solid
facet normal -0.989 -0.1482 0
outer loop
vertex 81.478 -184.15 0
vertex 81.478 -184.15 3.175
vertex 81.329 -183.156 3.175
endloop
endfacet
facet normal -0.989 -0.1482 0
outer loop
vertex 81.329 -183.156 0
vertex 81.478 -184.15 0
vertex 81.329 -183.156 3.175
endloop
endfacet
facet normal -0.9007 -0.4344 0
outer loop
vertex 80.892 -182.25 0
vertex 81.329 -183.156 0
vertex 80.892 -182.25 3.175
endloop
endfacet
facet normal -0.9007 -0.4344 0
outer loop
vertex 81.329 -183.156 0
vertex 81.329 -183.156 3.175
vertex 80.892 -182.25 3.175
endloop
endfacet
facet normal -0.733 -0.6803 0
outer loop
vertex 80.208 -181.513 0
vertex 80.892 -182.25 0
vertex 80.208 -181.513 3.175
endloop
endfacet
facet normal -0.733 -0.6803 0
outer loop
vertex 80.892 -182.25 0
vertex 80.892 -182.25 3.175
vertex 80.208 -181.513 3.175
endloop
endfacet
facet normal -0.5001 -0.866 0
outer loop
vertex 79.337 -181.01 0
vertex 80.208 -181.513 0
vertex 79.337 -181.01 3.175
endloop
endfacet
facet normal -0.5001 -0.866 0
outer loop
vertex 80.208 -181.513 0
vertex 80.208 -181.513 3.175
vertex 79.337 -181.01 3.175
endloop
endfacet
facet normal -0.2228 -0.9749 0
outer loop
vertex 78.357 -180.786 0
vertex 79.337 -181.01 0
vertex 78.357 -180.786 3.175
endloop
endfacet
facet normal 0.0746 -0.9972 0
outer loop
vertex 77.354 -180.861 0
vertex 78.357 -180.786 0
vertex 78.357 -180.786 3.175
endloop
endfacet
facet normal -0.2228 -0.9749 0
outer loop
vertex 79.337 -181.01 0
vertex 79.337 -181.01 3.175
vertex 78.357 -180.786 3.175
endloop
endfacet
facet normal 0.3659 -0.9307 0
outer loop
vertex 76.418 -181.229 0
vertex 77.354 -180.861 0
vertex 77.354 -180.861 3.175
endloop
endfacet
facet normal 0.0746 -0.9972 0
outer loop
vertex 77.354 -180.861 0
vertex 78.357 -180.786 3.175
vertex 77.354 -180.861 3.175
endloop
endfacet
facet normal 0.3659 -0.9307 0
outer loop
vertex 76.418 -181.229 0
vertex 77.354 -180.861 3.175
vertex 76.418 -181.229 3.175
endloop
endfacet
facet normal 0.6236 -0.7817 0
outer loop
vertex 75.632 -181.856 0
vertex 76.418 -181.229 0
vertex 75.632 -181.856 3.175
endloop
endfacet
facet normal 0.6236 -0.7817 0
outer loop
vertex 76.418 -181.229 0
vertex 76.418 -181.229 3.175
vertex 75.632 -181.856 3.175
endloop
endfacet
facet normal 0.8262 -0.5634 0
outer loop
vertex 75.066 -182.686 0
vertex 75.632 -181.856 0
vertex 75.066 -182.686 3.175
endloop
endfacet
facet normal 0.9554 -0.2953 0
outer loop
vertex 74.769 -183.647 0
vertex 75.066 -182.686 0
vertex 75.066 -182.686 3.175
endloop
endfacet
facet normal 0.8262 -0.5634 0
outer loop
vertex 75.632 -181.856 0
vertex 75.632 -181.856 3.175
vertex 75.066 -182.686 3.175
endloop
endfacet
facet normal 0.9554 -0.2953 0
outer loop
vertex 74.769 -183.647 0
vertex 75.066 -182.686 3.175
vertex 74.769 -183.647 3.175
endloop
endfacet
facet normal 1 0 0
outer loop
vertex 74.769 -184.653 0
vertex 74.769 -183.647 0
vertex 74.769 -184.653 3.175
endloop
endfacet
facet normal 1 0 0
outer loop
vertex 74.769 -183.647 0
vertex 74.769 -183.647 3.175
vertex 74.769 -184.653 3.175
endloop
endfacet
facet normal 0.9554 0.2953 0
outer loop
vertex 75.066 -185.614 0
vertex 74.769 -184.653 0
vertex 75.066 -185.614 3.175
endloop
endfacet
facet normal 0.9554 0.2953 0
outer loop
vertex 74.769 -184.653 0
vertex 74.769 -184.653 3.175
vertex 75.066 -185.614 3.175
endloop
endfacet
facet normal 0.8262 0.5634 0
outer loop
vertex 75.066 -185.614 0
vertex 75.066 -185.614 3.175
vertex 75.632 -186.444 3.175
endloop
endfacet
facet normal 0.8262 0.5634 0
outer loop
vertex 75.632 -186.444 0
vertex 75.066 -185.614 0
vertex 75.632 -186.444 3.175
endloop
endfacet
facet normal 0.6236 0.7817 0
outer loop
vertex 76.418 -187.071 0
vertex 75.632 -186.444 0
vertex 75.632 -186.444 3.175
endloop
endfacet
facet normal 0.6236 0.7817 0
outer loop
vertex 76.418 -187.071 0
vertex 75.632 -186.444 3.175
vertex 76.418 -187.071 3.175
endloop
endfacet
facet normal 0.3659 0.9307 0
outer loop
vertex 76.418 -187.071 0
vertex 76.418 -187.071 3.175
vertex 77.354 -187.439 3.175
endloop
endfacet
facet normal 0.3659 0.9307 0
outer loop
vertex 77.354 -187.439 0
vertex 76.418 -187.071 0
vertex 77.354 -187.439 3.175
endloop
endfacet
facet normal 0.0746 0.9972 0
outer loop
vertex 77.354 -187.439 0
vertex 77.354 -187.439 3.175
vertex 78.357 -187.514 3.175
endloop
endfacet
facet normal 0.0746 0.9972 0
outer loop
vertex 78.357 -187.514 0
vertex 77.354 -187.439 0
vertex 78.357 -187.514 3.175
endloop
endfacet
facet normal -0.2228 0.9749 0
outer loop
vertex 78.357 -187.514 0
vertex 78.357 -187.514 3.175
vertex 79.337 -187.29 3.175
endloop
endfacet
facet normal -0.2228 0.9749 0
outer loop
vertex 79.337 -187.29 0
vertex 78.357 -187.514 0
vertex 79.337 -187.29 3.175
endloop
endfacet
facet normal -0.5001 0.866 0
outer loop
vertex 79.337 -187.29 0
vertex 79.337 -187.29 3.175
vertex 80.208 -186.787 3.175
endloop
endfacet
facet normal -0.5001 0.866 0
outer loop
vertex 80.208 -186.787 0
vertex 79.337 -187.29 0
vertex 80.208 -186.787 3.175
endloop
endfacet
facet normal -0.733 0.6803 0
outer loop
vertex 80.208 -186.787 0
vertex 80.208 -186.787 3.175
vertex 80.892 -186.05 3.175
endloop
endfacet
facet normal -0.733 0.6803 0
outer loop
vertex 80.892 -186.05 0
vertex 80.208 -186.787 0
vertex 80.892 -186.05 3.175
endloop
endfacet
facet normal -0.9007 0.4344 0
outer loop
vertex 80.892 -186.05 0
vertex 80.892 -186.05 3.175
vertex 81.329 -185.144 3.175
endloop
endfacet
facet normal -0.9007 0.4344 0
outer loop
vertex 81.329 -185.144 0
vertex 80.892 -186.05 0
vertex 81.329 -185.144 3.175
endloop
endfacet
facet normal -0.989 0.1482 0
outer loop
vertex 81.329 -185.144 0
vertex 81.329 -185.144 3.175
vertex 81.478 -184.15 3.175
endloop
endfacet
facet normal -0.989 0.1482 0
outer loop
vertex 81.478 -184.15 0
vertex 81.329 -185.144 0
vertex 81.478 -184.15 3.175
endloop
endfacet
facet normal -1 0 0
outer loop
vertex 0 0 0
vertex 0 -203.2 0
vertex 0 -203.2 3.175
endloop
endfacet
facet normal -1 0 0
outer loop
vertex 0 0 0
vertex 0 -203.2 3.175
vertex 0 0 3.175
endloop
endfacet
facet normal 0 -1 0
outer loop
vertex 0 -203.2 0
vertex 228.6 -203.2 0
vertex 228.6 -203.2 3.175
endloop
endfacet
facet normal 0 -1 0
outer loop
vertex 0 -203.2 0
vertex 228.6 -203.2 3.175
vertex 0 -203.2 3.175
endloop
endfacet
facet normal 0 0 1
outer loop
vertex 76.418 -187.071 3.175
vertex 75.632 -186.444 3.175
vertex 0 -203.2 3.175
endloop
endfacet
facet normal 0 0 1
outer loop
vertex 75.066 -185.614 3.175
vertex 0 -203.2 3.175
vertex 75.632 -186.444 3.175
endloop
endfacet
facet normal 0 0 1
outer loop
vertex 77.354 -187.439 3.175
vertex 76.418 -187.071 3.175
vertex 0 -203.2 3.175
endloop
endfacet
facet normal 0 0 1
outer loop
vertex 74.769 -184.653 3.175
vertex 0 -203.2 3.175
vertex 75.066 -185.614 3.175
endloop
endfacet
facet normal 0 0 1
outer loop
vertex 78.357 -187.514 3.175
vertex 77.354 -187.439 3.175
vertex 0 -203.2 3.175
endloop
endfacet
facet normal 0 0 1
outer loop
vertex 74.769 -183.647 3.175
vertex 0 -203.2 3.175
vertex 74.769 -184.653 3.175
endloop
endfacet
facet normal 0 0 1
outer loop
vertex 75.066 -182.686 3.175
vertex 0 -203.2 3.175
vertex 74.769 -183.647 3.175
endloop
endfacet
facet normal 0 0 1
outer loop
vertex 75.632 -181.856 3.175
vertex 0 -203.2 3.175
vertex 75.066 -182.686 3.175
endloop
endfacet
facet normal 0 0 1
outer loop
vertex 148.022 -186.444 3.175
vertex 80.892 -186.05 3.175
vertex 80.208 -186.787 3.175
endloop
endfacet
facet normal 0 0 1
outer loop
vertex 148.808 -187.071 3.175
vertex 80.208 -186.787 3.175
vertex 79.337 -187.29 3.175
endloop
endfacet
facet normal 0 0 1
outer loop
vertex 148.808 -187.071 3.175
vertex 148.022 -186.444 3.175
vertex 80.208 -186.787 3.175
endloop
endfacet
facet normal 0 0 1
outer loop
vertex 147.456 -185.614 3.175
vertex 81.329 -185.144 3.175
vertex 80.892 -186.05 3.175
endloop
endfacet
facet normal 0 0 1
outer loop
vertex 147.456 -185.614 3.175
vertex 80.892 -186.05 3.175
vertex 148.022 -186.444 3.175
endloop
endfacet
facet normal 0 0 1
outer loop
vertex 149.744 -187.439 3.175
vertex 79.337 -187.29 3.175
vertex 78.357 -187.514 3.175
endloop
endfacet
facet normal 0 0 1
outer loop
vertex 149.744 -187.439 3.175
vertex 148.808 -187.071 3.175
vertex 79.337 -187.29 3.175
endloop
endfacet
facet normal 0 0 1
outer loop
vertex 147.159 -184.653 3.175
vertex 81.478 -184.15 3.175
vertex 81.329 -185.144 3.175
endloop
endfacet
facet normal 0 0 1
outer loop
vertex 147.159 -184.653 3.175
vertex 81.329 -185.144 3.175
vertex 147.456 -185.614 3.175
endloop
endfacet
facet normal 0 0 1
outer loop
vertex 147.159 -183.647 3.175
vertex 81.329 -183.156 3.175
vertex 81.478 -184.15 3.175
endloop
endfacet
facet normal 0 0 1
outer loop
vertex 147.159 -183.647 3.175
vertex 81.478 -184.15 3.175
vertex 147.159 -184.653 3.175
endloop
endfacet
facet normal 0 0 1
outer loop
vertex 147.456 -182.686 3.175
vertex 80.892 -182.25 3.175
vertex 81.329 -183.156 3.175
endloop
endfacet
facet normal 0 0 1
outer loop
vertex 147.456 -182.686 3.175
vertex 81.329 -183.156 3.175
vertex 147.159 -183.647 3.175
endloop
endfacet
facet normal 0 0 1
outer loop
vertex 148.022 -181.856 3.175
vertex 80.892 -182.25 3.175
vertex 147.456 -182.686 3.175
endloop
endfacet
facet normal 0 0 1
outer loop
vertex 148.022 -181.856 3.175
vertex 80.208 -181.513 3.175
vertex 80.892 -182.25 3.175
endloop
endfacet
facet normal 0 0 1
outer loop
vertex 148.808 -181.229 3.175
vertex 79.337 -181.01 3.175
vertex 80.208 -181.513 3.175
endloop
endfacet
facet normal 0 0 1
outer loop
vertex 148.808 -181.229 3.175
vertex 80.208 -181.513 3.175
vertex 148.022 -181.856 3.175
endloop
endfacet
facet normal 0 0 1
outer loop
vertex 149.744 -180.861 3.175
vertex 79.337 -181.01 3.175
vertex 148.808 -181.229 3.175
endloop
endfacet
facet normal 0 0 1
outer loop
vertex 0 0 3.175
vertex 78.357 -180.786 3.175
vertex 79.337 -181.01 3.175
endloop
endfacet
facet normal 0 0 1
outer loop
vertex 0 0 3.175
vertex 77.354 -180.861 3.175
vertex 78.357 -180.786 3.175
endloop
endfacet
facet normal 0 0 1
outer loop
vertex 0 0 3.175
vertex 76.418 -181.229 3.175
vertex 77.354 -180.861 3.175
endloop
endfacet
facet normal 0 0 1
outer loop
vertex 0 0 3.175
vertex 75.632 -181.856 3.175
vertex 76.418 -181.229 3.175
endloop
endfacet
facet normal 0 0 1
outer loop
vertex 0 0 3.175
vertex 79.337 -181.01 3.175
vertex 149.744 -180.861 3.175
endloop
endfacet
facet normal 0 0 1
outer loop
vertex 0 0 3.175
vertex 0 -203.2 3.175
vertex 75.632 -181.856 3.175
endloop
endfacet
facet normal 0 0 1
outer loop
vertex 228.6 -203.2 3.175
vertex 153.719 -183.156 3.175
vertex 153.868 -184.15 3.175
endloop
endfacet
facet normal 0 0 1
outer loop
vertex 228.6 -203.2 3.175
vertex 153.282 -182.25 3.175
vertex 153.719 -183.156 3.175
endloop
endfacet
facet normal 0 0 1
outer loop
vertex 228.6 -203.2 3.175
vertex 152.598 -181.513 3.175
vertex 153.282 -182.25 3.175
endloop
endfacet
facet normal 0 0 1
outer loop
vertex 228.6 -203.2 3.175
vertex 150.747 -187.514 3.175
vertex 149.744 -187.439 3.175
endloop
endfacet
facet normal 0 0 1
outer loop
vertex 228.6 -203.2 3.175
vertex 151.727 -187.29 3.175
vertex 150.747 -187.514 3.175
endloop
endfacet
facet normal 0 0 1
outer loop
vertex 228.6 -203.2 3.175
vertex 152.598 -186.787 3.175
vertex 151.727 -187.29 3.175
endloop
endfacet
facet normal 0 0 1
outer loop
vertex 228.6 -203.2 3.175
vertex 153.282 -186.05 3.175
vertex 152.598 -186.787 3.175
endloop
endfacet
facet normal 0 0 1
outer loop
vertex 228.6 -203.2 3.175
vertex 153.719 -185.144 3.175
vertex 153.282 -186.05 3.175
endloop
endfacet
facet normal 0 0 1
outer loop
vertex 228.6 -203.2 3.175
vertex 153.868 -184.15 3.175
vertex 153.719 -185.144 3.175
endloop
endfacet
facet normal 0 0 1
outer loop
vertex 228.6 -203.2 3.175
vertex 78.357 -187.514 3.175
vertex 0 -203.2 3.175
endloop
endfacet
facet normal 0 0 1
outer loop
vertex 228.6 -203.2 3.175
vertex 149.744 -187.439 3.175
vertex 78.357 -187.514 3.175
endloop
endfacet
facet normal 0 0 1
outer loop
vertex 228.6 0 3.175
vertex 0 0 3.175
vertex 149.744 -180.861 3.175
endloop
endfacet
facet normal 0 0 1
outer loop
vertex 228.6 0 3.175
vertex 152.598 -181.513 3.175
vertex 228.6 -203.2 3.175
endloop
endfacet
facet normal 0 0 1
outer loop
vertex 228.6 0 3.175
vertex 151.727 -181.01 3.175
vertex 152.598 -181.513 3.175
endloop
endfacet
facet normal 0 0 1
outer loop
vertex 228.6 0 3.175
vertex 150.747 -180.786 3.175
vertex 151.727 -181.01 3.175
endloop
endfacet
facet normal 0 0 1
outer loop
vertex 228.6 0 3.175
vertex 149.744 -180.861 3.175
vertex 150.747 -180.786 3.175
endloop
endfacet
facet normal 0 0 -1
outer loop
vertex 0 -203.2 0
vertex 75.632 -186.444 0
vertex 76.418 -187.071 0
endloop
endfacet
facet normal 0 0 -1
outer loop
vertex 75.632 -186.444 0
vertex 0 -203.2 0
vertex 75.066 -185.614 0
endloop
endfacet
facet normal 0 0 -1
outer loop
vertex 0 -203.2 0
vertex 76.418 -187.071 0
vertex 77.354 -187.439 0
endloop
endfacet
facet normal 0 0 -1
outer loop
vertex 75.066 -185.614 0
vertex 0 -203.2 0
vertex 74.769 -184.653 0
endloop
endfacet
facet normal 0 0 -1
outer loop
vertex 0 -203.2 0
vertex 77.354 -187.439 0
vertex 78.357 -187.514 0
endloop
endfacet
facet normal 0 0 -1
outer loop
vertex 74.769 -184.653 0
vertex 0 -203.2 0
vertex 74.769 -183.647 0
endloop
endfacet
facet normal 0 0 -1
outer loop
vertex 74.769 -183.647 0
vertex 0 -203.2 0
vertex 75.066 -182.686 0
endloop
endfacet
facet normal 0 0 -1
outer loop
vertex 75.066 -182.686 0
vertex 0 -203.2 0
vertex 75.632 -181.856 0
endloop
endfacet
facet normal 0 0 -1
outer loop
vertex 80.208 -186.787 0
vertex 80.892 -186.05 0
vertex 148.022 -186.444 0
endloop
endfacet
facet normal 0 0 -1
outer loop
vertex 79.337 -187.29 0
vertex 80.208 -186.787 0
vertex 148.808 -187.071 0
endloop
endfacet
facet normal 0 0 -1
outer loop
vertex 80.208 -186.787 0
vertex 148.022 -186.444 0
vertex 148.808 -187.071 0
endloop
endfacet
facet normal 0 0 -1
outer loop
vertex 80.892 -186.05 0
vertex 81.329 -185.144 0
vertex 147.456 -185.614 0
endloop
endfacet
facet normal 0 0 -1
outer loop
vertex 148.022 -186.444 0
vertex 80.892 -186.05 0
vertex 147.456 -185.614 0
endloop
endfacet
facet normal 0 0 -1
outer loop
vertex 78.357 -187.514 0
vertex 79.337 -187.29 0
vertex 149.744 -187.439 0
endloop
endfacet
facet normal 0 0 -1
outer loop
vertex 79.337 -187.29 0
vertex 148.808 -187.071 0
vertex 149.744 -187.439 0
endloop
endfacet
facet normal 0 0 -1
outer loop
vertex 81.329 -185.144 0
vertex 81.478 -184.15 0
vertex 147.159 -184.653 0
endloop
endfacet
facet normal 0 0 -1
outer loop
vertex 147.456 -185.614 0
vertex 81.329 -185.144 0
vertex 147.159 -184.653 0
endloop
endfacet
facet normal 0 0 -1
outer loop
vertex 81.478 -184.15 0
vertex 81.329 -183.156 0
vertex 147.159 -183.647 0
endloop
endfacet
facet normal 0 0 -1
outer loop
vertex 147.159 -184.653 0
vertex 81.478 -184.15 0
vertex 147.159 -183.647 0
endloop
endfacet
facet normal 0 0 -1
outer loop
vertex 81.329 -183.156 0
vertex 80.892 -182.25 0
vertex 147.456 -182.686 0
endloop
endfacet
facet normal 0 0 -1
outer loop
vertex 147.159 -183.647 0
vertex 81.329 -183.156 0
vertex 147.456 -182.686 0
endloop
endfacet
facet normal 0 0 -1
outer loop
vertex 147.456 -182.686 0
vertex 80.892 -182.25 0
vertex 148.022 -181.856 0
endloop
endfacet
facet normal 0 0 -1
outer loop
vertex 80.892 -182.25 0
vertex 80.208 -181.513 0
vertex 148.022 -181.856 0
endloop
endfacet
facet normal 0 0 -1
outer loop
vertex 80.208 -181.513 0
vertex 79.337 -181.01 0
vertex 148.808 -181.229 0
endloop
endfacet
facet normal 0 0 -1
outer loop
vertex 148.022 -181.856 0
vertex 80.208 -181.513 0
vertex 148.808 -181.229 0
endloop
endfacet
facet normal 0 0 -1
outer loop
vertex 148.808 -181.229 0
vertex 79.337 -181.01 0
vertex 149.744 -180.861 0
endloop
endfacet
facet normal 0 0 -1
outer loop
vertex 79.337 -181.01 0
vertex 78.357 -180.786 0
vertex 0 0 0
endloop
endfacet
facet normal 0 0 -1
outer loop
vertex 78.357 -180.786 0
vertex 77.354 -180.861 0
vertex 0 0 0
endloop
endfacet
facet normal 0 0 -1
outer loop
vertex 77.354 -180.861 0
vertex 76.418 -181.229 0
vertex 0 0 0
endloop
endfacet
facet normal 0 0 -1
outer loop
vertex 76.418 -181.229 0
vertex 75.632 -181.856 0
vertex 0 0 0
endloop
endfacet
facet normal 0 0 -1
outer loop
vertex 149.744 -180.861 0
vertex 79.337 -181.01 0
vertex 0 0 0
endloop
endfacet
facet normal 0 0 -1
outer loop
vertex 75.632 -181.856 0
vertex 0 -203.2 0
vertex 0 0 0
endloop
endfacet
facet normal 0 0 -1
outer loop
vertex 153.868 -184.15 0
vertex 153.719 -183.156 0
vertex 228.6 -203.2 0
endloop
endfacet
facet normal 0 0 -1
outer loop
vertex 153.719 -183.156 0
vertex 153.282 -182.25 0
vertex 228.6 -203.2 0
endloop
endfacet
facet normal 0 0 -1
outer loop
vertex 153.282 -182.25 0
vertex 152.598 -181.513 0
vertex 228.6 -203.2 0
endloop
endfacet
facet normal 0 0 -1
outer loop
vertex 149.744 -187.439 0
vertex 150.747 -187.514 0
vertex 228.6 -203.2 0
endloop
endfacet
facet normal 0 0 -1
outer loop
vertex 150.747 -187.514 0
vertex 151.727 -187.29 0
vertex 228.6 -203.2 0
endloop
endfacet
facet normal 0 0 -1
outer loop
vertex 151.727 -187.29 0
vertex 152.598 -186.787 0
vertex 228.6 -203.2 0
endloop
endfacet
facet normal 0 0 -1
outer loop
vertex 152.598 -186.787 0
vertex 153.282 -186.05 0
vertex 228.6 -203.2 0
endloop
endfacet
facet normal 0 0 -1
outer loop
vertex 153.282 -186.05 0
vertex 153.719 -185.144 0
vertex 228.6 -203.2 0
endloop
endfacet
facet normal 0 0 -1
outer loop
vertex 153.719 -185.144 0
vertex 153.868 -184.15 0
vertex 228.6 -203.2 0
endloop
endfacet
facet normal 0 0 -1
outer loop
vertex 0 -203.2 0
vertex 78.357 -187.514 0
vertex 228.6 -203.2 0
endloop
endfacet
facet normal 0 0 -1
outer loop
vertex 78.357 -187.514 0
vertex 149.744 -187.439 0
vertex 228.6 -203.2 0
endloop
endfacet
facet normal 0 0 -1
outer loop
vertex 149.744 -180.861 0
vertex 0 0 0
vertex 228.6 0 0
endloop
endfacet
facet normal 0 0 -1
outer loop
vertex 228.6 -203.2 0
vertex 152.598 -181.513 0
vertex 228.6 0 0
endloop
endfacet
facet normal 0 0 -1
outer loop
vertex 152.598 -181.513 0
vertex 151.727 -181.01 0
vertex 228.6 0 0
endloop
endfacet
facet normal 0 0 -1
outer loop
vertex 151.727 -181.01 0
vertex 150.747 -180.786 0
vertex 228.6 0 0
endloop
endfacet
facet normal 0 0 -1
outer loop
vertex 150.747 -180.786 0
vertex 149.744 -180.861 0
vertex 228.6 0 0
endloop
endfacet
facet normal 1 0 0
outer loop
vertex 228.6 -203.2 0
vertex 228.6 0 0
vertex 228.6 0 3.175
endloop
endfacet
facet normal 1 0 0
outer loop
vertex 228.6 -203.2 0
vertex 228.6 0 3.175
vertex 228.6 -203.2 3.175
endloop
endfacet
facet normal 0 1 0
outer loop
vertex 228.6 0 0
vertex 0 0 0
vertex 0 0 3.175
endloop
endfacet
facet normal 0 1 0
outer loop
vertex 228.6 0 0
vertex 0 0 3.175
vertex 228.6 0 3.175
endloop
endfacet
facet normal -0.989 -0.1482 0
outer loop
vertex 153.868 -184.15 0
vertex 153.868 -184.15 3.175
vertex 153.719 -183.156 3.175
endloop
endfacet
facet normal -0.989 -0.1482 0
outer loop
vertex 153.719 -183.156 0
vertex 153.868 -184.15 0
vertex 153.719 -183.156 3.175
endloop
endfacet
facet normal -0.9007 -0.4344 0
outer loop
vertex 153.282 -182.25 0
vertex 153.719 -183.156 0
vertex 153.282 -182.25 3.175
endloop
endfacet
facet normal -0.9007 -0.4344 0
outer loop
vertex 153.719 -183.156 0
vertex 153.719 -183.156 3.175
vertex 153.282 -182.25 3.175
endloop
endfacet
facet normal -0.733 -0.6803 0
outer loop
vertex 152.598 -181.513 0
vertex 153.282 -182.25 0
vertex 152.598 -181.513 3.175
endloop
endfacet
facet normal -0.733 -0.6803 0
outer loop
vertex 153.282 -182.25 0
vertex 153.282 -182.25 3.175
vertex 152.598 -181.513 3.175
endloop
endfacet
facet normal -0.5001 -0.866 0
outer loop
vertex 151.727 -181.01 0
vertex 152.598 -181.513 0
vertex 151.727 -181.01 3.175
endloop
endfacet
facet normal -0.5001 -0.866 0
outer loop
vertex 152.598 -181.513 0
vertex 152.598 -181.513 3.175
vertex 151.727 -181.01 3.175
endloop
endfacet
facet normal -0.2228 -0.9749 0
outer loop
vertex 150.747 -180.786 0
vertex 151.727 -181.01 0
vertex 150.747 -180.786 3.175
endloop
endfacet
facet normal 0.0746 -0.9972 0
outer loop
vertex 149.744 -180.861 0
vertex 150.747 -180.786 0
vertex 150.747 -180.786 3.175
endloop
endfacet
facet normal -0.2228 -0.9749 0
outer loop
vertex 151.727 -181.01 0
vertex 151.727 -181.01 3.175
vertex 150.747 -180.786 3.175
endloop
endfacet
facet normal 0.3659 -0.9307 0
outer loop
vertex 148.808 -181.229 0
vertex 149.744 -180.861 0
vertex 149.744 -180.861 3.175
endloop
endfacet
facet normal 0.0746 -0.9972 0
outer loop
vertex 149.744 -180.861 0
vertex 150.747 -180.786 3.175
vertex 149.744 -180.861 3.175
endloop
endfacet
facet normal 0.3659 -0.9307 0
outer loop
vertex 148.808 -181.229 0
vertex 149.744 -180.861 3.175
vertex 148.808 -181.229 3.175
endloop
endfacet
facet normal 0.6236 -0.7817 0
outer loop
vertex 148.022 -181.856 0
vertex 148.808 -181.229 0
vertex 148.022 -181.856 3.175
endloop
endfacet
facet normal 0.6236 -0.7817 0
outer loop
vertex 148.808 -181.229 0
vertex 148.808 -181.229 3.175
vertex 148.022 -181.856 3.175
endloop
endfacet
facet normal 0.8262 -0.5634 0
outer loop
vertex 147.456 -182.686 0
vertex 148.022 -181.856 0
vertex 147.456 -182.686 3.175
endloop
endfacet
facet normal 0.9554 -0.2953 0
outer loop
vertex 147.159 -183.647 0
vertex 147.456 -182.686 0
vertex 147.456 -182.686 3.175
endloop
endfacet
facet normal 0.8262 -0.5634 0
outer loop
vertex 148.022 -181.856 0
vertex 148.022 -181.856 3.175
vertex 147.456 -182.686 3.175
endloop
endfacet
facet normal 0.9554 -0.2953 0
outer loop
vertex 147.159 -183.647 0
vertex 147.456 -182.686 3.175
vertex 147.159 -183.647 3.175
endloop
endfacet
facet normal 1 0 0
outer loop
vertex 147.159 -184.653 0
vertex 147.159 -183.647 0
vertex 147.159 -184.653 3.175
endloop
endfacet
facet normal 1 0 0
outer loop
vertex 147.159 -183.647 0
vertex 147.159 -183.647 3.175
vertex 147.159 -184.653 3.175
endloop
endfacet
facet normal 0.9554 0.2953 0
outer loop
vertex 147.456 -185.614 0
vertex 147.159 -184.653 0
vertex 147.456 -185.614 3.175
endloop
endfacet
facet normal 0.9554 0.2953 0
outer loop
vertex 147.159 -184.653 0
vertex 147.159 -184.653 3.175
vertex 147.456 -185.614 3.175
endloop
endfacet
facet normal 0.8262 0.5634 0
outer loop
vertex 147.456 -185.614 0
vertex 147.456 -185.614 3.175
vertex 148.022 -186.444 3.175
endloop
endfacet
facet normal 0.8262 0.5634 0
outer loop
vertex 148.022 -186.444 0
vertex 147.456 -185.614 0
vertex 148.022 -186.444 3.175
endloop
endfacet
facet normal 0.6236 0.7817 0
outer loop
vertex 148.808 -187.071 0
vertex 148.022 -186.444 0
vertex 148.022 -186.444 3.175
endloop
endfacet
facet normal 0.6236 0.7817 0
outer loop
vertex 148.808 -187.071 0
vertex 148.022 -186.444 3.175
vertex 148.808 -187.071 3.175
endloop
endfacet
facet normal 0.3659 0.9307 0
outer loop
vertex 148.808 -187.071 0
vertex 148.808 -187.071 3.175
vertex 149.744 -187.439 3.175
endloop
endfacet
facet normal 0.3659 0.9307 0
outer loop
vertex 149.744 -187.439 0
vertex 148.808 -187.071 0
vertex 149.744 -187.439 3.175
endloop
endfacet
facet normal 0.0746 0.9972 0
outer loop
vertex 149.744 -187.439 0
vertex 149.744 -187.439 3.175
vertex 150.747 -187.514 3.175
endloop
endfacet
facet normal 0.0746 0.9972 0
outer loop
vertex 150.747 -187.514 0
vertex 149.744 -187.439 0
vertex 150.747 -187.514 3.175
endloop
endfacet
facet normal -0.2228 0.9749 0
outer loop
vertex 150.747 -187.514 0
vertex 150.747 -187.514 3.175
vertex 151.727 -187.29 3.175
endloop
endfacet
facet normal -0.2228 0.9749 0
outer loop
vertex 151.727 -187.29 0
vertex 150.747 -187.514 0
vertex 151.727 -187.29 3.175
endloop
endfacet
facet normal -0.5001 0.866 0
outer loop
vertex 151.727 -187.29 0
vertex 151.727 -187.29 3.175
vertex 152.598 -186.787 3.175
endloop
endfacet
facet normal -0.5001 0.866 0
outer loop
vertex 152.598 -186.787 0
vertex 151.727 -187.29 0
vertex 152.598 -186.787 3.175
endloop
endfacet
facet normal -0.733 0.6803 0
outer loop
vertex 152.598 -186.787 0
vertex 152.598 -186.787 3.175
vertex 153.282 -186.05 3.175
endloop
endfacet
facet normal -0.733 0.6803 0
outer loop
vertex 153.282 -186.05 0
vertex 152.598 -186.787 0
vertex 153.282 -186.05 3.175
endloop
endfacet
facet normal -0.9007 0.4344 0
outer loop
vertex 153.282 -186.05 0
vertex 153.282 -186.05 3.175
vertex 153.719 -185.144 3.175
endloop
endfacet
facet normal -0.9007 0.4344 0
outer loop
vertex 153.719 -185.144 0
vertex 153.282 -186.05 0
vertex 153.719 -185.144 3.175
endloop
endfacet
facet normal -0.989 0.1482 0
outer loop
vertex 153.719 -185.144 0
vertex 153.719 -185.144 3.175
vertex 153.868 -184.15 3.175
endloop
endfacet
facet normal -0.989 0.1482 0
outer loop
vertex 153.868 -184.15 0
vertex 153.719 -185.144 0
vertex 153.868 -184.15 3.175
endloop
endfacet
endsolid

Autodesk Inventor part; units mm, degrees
ref_plane "YZ Plane" through (0, 0, 0) normal (1, 0, 0) x (0, 1, 0)
ref_plane "XZ Plane" through (0, 0, 0) normal (0, 1, 0) x (-1, 0, 0)
ref_plane "XY Plane" through (0, 0, 0) normal (0, 0, 1) x (1, 0, 0)
sketch "Sketch1" plane through (0, 0, 0) normal (0, 0, 1) x (1, 0, 0)
  line L0 (0, 0) -> (228.6, 0)
  line L1 (228.6, 0) -> (228.6, -203.2)
  line L2 (228.6, -203.2) -> (0, -203.2)
  line L3 (0, -203.2) -> (0, 0)
  dimension "d0" = 228.6
  dimension "d1" = 203.2
extrude "Extrusion1" add sketch "Sketch1" along normal blind 3.175
sketch "Sketch2" plane through (0, 0, 3.175) normal (0, 0, 1) x (1, 0, 0)
  circle A0 centre (78.105, -184.15) radius 3.3734
  circle A1 centre (150.495, -184.15) radius 3.3734
  line L0 (0, -203.2) -> (228.6, -203.2) projected
  line L1 (0, 0) -> (0, -203.2) projected
  dimension "d4" = 6.7469
  dimension "d5" = 6.7469
  dimension "d6" = 19.05
  dimension "d7" = 19.05
  dimension "d8" = 72.39
  dimension "d9" = 78.105
extrude "Extrusion2" cut sketch "Sketch2" against normal blind 3.175
properties part number "plate"
